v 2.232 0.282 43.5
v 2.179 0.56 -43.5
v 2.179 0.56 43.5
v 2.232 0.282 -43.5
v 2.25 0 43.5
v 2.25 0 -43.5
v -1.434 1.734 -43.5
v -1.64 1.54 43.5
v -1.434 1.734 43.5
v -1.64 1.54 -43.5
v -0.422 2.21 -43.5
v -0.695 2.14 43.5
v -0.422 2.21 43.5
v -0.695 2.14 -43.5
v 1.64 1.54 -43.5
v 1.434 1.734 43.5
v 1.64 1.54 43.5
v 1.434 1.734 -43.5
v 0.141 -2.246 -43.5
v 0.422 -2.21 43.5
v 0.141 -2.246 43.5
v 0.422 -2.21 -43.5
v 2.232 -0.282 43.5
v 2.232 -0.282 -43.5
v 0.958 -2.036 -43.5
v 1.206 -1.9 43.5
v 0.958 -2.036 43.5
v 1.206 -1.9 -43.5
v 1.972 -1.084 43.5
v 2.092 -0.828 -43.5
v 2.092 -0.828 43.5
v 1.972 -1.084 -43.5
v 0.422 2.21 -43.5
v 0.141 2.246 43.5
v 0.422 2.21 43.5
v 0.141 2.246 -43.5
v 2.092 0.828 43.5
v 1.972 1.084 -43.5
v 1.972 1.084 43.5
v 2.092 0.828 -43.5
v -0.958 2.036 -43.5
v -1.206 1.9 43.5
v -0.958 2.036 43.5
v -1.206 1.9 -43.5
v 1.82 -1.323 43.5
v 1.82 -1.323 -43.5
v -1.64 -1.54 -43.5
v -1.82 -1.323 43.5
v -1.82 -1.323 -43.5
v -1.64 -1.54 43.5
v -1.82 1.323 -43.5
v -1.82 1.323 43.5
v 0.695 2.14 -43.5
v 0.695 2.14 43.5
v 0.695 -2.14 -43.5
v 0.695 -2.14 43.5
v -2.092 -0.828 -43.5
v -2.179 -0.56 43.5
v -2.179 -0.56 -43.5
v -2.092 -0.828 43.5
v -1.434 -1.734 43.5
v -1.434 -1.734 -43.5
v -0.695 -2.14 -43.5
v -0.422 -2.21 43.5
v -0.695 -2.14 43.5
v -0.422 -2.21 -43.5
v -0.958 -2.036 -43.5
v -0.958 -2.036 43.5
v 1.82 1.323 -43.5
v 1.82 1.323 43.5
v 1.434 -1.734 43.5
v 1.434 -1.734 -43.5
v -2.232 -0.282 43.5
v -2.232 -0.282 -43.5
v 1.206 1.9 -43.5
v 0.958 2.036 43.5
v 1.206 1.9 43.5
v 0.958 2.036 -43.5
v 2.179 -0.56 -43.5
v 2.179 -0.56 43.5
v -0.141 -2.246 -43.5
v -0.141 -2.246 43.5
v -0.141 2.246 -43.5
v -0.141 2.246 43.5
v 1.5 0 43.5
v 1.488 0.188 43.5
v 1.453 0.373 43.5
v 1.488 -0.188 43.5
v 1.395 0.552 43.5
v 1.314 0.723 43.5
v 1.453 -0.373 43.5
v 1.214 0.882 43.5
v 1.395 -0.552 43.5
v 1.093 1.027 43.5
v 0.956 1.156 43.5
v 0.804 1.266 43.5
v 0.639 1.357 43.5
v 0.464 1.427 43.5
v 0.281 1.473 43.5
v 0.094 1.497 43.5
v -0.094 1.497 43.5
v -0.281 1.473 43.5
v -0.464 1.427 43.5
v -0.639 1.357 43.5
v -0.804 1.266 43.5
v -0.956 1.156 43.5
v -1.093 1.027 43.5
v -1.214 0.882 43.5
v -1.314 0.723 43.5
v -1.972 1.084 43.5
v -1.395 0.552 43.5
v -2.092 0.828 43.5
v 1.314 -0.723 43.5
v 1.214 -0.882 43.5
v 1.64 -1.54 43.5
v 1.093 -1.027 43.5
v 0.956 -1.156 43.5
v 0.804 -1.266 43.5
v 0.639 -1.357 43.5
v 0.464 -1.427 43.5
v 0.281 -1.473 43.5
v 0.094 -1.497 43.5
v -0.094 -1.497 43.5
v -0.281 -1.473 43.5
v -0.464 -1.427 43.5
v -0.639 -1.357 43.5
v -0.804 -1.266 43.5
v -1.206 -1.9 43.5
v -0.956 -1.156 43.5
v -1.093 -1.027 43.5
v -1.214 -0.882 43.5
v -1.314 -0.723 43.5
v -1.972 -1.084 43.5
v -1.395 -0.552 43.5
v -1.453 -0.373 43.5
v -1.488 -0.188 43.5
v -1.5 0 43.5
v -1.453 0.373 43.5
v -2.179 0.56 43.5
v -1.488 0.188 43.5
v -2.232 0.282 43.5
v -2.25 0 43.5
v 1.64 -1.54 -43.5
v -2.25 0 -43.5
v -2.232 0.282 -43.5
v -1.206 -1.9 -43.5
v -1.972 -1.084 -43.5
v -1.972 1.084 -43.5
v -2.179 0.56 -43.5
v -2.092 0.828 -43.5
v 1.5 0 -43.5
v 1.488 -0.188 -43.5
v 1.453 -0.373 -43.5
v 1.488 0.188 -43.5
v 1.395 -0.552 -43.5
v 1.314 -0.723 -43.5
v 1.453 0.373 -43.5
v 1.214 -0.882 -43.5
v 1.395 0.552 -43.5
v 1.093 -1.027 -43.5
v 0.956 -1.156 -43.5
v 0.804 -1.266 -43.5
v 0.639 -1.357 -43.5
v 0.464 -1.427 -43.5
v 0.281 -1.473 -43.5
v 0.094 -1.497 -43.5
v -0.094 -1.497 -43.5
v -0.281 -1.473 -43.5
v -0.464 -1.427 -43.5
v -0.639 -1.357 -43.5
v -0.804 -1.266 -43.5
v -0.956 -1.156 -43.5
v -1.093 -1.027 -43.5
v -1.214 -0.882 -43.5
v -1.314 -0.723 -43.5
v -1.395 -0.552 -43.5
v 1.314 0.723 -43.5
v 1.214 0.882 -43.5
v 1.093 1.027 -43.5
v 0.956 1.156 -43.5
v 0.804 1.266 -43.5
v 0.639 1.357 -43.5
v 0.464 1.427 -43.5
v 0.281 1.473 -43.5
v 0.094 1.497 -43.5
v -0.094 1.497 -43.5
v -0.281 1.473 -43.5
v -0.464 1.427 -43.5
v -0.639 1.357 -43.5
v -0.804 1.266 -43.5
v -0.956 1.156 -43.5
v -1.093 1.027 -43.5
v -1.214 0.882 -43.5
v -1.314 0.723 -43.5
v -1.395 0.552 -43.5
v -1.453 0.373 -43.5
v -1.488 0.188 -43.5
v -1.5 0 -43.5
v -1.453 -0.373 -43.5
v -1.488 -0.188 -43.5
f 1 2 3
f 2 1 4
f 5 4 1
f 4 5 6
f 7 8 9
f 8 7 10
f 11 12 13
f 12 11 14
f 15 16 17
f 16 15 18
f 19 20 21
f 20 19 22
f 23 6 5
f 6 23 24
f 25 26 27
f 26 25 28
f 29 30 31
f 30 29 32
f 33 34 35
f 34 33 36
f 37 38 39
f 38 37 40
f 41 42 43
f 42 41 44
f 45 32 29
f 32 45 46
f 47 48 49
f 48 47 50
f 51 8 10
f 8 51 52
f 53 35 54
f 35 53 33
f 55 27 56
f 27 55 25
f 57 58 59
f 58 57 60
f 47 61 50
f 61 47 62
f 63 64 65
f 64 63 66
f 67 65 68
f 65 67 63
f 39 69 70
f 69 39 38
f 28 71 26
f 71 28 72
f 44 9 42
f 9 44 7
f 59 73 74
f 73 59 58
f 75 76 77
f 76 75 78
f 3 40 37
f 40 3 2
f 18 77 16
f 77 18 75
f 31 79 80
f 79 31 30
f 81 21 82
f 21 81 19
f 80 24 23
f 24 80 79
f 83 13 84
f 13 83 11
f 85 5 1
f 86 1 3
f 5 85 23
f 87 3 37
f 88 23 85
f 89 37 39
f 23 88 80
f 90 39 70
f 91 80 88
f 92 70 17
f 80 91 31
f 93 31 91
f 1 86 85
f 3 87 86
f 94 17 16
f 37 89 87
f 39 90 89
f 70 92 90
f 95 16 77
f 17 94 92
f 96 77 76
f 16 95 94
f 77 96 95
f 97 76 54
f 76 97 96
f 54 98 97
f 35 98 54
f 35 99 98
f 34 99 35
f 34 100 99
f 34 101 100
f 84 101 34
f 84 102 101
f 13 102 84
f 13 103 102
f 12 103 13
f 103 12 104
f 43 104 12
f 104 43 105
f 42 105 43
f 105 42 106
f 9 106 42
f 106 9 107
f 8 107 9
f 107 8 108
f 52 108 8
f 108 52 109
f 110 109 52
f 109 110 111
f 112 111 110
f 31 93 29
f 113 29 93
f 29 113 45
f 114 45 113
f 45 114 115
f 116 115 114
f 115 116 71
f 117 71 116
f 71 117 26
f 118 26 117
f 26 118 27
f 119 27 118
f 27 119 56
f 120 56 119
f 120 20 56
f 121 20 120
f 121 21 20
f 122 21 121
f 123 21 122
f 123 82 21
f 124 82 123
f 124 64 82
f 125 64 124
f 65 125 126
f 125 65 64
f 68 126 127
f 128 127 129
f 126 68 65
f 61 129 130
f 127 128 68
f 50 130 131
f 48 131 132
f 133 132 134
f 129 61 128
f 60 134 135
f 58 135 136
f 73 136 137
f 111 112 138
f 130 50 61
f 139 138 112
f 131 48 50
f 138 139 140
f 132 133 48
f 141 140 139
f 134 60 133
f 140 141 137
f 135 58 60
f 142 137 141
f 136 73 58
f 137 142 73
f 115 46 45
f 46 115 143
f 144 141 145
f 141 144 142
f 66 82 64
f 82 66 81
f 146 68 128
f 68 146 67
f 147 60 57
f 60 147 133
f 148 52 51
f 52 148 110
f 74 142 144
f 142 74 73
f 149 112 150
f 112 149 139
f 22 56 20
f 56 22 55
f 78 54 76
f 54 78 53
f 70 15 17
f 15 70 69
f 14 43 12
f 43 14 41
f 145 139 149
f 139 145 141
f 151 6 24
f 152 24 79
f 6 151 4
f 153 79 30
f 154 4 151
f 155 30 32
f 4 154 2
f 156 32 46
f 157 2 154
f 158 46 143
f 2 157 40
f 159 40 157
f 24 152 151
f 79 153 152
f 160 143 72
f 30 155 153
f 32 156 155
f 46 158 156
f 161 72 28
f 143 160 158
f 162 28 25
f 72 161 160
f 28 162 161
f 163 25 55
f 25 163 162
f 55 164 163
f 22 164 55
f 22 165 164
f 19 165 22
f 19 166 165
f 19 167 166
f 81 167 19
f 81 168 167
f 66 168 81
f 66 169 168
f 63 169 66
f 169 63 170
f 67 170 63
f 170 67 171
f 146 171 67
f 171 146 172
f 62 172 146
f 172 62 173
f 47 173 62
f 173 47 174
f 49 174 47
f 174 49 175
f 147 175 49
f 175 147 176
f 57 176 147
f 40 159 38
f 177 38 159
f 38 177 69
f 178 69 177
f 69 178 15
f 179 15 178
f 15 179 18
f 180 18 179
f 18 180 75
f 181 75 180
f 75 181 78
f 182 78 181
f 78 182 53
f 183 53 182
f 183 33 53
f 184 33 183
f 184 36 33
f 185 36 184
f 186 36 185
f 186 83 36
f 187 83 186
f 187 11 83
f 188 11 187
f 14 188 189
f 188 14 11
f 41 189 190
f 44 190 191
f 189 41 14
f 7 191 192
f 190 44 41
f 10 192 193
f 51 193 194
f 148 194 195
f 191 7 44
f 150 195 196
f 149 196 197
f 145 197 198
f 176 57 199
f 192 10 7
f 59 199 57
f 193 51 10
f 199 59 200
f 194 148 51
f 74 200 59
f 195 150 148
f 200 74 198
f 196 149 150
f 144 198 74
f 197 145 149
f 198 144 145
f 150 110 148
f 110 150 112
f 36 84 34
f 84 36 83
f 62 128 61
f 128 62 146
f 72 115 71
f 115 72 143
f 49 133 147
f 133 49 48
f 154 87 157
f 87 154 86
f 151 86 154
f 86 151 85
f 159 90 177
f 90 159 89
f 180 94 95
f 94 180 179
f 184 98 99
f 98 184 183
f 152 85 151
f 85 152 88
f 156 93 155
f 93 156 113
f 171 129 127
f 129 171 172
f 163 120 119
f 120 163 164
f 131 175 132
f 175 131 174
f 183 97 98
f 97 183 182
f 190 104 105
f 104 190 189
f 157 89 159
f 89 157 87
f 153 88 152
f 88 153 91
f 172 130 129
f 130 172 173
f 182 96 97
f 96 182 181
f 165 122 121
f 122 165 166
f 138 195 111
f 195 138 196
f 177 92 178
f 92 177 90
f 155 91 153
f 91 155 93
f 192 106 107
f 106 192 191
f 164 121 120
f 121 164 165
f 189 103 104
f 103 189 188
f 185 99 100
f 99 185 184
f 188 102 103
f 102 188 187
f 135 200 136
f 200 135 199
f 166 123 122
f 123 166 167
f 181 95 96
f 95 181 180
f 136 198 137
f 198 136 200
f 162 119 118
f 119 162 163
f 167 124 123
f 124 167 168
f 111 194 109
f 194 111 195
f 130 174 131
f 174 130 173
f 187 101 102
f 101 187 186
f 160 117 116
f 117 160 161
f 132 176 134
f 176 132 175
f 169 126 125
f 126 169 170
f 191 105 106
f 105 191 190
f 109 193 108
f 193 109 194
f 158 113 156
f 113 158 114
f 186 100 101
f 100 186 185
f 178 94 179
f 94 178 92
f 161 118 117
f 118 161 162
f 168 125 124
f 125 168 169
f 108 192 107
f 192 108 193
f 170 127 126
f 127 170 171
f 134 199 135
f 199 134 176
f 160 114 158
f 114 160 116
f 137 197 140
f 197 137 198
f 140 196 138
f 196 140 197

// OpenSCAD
$fn = 50;


difference() {
	union() {
		translate(v = [0, 0, -43.5000000000]) {
			cylinder(h = 87, r = 2.2500000000);
		}
	}
	union() {
		translate(v = [0, 0, -100.0000000000]) {
			cylinder(h = 200, r = 1.5000000000);
		}
	}
}
